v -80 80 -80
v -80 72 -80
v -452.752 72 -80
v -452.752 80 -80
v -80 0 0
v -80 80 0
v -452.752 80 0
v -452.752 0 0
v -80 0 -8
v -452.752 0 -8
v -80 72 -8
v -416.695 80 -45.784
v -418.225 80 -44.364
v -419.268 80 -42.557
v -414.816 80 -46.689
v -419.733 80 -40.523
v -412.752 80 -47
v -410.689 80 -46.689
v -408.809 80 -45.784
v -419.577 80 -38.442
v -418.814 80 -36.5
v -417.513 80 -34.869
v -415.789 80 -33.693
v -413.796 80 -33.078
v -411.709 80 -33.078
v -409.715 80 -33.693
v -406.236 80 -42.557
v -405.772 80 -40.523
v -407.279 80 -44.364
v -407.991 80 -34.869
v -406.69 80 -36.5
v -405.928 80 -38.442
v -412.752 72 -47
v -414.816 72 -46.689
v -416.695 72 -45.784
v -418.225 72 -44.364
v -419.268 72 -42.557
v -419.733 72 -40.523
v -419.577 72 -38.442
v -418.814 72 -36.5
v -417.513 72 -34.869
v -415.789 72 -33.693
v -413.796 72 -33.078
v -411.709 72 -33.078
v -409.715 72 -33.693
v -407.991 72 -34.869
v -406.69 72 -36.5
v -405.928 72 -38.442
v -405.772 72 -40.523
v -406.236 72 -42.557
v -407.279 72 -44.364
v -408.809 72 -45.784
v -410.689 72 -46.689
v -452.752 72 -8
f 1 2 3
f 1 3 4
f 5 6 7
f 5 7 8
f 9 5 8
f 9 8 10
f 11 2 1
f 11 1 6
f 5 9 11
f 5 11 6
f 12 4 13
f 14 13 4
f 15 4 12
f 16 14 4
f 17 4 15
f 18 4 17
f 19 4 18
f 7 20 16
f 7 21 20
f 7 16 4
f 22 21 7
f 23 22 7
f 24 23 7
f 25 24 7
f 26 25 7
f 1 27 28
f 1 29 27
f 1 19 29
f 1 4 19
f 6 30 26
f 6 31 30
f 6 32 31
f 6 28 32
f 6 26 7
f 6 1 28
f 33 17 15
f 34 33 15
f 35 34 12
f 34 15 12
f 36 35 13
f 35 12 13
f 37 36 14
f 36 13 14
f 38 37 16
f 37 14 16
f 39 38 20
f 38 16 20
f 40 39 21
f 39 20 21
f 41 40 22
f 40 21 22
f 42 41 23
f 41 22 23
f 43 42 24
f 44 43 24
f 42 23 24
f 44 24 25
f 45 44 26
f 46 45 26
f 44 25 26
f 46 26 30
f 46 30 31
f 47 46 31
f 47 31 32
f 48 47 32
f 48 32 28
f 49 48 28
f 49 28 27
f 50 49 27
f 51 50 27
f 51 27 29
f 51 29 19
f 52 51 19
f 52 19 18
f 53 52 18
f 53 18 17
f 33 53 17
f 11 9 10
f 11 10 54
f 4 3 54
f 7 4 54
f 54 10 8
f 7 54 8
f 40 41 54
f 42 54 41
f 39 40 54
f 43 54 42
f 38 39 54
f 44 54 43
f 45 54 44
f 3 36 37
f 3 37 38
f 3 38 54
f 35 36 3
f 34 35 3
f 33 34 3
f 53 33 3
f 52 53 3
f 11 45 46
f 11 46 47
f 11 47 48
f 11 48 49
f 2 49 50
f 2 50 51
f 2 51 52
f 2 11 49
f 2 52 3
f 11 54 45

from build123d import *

# Parameters (mm, degrees)
PAD_DEPTH            = 372.752246
SKETCH001_R          = 7
POCKET_DEPTH         = 80.001
BODY_ROLL_ANGLE      = -90
BODY_PLACEMENT_ANGLE = 180


with BuildPart() as part:
    # Sketch → Pad (new body)
    with BuildSketch(Plane.YZ):
        Polygon((0, 0), (0, 80), (8, 80), (8, 8), (80, 8), (80, 0), align=None)
    extrude(amount=PAD_DEPTH)

    # Sketch001 (on Face6 of Pad) → Pocket (cut, through all)
    with BuildSketch(Plane.YX):
        with Locations((40, 332.752246)):
            Circle(SKETCH001_R)
    extrude(amount=-POCKET_DEPTH, mode=Mode.SUBTRACT)


with BuildPart() as part_1:
    # Body roll: moved
    add(part.part.rotate(Axis((0, 0, 0), (1, 0, 0)), BODY_ROLL_ANGLE))


with BuildPart() as part_2:
    # Body placement: moved
    add(part_1.part.moved(Location((-80, 80, 0))).rotate(Axis((-80, 80, 0), (0, 0, 1)), BODY_PLACEMENT_ANGLE))


solid = part_2.part
